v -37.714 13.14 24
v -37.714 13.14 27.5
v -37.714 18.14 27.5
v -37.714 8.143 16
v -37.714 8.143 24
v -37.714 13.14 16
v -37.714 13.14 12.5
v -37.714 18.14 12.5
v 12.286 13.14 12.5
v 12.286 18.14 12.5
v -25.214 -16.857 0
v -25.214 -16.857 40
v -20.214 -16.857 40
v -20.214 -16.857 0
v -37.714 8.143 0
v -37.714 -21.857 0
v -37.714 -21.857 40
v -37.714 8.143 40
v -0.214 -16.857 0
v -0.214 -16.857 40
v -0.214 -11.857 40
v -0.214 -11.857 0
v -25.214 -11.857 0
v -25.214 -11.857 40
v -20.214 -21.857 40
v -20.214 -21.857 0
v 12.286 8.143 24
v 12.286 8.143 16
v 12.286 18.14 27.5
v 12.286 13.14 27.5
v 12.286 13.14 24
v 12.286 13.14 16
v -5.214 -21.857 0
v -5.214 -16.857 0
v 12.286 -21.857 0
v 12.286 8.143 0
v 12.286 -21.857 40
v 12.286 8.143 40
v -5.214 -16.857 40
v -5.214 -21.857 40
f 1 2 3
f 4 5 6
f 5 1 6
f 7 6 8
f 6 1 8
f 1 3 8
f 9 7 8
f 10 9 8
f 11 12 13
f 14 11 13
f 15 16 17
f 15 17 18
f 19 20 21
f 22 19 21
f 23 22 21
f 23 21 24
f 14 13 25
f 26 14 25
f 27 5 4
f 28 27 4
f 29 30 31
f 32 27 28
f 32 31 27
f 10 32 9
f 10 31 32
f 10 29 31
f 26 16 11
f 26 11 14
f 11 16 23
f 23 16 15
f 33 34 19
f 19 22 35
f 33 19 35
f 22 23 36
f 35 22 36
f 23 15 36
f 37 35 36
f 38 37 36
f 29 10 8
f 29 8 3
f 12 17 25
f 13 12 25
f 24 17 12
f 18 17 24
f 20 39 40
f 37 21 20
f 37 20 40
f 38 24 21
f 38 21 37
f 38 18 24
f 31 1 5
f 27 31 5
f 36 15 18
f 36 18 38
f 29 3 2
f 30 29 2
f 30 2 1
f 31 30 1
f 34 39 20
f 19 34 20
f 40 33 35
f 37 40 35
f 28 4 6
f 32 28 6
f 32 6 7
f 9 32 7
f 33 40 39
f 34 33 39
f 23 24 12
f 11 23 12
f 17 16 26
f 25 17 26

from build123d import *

# Parameters (mm, degrees)
SKETCH1_W                = 50
SKETCH1_H                = 30
BOSS_EXTRUDE1_DEPTH      = 40
CUT_EXTRUDE12_START      = -40
CUT_EXTRUDE12_DEPTH      = 40
BOSS_EXTRUDE2_DEPTH      = 12.285714
BOSS_EXTRUDE2_DEPTH_BACK = 37.714286


# Read off the part's stored shape, not the designer's step: Cut-Extrude12
with BuildPart() as part:
    # Sketch1 → Boss-Extrude1 (new body)
    with BuildSketch(Plane.XY):
        with Locations((-12.714285714, -6.857142857)):
            Rectangle(SKETCH1_W, SKETCH1_H)
    extrude(amount=BOSS_EXTRUDE1_DEPTH)

    # Cut-Extrude12 outline → Cut-Extrude12 (cut)
    with BuildSketch(Plane.XY.offset(40).offset(CUT_EXTRUDE12_START)):
        Polygon((-25.214285714, -16.857142857), (-20.214285714, -16.857142857), (-20.214285714, -21.857142857), (-5.214285714, -21.857142857), (-5.214285714, -16.857142857), (-0.214285714, -16.857142857), (-0.214285714, -11.857142857), (-25.214285714, -11.857142857), align=None)
    extrude(amount=CUT_EXTRUDE12_DEPTH, mode=Mode.SUBTRACT)


with BuildPart() as body_2:
    # Sketch3 → Boss-Extrude2 (new, two sides: drawn at the far end of the back side and taken through both)
    with BuildSketch(Plane(origin=(0, 0, 0), x_dir=(0, 0, -1), z_dir=(1, 0, 0)).offset(-BOSS_EXTRUDE2_DEPTH_BACK)):
        Polygon((-24, 8.142857143), (-16, 8.142857143), (-16, 13.139548849), (-12.5, 13.139548849), (-12.5, 18.139548849), (-27.5, 18.139548849), (-27.5, 13.139548849), (-24, 13.139548849), align=None)
    extrude(amount=BOSS_EXTRUDE2_DEPTH + BOSS_EXTRUDE2_DEPTH_BACK)


solid = Compound([part.part, body_2.part])
